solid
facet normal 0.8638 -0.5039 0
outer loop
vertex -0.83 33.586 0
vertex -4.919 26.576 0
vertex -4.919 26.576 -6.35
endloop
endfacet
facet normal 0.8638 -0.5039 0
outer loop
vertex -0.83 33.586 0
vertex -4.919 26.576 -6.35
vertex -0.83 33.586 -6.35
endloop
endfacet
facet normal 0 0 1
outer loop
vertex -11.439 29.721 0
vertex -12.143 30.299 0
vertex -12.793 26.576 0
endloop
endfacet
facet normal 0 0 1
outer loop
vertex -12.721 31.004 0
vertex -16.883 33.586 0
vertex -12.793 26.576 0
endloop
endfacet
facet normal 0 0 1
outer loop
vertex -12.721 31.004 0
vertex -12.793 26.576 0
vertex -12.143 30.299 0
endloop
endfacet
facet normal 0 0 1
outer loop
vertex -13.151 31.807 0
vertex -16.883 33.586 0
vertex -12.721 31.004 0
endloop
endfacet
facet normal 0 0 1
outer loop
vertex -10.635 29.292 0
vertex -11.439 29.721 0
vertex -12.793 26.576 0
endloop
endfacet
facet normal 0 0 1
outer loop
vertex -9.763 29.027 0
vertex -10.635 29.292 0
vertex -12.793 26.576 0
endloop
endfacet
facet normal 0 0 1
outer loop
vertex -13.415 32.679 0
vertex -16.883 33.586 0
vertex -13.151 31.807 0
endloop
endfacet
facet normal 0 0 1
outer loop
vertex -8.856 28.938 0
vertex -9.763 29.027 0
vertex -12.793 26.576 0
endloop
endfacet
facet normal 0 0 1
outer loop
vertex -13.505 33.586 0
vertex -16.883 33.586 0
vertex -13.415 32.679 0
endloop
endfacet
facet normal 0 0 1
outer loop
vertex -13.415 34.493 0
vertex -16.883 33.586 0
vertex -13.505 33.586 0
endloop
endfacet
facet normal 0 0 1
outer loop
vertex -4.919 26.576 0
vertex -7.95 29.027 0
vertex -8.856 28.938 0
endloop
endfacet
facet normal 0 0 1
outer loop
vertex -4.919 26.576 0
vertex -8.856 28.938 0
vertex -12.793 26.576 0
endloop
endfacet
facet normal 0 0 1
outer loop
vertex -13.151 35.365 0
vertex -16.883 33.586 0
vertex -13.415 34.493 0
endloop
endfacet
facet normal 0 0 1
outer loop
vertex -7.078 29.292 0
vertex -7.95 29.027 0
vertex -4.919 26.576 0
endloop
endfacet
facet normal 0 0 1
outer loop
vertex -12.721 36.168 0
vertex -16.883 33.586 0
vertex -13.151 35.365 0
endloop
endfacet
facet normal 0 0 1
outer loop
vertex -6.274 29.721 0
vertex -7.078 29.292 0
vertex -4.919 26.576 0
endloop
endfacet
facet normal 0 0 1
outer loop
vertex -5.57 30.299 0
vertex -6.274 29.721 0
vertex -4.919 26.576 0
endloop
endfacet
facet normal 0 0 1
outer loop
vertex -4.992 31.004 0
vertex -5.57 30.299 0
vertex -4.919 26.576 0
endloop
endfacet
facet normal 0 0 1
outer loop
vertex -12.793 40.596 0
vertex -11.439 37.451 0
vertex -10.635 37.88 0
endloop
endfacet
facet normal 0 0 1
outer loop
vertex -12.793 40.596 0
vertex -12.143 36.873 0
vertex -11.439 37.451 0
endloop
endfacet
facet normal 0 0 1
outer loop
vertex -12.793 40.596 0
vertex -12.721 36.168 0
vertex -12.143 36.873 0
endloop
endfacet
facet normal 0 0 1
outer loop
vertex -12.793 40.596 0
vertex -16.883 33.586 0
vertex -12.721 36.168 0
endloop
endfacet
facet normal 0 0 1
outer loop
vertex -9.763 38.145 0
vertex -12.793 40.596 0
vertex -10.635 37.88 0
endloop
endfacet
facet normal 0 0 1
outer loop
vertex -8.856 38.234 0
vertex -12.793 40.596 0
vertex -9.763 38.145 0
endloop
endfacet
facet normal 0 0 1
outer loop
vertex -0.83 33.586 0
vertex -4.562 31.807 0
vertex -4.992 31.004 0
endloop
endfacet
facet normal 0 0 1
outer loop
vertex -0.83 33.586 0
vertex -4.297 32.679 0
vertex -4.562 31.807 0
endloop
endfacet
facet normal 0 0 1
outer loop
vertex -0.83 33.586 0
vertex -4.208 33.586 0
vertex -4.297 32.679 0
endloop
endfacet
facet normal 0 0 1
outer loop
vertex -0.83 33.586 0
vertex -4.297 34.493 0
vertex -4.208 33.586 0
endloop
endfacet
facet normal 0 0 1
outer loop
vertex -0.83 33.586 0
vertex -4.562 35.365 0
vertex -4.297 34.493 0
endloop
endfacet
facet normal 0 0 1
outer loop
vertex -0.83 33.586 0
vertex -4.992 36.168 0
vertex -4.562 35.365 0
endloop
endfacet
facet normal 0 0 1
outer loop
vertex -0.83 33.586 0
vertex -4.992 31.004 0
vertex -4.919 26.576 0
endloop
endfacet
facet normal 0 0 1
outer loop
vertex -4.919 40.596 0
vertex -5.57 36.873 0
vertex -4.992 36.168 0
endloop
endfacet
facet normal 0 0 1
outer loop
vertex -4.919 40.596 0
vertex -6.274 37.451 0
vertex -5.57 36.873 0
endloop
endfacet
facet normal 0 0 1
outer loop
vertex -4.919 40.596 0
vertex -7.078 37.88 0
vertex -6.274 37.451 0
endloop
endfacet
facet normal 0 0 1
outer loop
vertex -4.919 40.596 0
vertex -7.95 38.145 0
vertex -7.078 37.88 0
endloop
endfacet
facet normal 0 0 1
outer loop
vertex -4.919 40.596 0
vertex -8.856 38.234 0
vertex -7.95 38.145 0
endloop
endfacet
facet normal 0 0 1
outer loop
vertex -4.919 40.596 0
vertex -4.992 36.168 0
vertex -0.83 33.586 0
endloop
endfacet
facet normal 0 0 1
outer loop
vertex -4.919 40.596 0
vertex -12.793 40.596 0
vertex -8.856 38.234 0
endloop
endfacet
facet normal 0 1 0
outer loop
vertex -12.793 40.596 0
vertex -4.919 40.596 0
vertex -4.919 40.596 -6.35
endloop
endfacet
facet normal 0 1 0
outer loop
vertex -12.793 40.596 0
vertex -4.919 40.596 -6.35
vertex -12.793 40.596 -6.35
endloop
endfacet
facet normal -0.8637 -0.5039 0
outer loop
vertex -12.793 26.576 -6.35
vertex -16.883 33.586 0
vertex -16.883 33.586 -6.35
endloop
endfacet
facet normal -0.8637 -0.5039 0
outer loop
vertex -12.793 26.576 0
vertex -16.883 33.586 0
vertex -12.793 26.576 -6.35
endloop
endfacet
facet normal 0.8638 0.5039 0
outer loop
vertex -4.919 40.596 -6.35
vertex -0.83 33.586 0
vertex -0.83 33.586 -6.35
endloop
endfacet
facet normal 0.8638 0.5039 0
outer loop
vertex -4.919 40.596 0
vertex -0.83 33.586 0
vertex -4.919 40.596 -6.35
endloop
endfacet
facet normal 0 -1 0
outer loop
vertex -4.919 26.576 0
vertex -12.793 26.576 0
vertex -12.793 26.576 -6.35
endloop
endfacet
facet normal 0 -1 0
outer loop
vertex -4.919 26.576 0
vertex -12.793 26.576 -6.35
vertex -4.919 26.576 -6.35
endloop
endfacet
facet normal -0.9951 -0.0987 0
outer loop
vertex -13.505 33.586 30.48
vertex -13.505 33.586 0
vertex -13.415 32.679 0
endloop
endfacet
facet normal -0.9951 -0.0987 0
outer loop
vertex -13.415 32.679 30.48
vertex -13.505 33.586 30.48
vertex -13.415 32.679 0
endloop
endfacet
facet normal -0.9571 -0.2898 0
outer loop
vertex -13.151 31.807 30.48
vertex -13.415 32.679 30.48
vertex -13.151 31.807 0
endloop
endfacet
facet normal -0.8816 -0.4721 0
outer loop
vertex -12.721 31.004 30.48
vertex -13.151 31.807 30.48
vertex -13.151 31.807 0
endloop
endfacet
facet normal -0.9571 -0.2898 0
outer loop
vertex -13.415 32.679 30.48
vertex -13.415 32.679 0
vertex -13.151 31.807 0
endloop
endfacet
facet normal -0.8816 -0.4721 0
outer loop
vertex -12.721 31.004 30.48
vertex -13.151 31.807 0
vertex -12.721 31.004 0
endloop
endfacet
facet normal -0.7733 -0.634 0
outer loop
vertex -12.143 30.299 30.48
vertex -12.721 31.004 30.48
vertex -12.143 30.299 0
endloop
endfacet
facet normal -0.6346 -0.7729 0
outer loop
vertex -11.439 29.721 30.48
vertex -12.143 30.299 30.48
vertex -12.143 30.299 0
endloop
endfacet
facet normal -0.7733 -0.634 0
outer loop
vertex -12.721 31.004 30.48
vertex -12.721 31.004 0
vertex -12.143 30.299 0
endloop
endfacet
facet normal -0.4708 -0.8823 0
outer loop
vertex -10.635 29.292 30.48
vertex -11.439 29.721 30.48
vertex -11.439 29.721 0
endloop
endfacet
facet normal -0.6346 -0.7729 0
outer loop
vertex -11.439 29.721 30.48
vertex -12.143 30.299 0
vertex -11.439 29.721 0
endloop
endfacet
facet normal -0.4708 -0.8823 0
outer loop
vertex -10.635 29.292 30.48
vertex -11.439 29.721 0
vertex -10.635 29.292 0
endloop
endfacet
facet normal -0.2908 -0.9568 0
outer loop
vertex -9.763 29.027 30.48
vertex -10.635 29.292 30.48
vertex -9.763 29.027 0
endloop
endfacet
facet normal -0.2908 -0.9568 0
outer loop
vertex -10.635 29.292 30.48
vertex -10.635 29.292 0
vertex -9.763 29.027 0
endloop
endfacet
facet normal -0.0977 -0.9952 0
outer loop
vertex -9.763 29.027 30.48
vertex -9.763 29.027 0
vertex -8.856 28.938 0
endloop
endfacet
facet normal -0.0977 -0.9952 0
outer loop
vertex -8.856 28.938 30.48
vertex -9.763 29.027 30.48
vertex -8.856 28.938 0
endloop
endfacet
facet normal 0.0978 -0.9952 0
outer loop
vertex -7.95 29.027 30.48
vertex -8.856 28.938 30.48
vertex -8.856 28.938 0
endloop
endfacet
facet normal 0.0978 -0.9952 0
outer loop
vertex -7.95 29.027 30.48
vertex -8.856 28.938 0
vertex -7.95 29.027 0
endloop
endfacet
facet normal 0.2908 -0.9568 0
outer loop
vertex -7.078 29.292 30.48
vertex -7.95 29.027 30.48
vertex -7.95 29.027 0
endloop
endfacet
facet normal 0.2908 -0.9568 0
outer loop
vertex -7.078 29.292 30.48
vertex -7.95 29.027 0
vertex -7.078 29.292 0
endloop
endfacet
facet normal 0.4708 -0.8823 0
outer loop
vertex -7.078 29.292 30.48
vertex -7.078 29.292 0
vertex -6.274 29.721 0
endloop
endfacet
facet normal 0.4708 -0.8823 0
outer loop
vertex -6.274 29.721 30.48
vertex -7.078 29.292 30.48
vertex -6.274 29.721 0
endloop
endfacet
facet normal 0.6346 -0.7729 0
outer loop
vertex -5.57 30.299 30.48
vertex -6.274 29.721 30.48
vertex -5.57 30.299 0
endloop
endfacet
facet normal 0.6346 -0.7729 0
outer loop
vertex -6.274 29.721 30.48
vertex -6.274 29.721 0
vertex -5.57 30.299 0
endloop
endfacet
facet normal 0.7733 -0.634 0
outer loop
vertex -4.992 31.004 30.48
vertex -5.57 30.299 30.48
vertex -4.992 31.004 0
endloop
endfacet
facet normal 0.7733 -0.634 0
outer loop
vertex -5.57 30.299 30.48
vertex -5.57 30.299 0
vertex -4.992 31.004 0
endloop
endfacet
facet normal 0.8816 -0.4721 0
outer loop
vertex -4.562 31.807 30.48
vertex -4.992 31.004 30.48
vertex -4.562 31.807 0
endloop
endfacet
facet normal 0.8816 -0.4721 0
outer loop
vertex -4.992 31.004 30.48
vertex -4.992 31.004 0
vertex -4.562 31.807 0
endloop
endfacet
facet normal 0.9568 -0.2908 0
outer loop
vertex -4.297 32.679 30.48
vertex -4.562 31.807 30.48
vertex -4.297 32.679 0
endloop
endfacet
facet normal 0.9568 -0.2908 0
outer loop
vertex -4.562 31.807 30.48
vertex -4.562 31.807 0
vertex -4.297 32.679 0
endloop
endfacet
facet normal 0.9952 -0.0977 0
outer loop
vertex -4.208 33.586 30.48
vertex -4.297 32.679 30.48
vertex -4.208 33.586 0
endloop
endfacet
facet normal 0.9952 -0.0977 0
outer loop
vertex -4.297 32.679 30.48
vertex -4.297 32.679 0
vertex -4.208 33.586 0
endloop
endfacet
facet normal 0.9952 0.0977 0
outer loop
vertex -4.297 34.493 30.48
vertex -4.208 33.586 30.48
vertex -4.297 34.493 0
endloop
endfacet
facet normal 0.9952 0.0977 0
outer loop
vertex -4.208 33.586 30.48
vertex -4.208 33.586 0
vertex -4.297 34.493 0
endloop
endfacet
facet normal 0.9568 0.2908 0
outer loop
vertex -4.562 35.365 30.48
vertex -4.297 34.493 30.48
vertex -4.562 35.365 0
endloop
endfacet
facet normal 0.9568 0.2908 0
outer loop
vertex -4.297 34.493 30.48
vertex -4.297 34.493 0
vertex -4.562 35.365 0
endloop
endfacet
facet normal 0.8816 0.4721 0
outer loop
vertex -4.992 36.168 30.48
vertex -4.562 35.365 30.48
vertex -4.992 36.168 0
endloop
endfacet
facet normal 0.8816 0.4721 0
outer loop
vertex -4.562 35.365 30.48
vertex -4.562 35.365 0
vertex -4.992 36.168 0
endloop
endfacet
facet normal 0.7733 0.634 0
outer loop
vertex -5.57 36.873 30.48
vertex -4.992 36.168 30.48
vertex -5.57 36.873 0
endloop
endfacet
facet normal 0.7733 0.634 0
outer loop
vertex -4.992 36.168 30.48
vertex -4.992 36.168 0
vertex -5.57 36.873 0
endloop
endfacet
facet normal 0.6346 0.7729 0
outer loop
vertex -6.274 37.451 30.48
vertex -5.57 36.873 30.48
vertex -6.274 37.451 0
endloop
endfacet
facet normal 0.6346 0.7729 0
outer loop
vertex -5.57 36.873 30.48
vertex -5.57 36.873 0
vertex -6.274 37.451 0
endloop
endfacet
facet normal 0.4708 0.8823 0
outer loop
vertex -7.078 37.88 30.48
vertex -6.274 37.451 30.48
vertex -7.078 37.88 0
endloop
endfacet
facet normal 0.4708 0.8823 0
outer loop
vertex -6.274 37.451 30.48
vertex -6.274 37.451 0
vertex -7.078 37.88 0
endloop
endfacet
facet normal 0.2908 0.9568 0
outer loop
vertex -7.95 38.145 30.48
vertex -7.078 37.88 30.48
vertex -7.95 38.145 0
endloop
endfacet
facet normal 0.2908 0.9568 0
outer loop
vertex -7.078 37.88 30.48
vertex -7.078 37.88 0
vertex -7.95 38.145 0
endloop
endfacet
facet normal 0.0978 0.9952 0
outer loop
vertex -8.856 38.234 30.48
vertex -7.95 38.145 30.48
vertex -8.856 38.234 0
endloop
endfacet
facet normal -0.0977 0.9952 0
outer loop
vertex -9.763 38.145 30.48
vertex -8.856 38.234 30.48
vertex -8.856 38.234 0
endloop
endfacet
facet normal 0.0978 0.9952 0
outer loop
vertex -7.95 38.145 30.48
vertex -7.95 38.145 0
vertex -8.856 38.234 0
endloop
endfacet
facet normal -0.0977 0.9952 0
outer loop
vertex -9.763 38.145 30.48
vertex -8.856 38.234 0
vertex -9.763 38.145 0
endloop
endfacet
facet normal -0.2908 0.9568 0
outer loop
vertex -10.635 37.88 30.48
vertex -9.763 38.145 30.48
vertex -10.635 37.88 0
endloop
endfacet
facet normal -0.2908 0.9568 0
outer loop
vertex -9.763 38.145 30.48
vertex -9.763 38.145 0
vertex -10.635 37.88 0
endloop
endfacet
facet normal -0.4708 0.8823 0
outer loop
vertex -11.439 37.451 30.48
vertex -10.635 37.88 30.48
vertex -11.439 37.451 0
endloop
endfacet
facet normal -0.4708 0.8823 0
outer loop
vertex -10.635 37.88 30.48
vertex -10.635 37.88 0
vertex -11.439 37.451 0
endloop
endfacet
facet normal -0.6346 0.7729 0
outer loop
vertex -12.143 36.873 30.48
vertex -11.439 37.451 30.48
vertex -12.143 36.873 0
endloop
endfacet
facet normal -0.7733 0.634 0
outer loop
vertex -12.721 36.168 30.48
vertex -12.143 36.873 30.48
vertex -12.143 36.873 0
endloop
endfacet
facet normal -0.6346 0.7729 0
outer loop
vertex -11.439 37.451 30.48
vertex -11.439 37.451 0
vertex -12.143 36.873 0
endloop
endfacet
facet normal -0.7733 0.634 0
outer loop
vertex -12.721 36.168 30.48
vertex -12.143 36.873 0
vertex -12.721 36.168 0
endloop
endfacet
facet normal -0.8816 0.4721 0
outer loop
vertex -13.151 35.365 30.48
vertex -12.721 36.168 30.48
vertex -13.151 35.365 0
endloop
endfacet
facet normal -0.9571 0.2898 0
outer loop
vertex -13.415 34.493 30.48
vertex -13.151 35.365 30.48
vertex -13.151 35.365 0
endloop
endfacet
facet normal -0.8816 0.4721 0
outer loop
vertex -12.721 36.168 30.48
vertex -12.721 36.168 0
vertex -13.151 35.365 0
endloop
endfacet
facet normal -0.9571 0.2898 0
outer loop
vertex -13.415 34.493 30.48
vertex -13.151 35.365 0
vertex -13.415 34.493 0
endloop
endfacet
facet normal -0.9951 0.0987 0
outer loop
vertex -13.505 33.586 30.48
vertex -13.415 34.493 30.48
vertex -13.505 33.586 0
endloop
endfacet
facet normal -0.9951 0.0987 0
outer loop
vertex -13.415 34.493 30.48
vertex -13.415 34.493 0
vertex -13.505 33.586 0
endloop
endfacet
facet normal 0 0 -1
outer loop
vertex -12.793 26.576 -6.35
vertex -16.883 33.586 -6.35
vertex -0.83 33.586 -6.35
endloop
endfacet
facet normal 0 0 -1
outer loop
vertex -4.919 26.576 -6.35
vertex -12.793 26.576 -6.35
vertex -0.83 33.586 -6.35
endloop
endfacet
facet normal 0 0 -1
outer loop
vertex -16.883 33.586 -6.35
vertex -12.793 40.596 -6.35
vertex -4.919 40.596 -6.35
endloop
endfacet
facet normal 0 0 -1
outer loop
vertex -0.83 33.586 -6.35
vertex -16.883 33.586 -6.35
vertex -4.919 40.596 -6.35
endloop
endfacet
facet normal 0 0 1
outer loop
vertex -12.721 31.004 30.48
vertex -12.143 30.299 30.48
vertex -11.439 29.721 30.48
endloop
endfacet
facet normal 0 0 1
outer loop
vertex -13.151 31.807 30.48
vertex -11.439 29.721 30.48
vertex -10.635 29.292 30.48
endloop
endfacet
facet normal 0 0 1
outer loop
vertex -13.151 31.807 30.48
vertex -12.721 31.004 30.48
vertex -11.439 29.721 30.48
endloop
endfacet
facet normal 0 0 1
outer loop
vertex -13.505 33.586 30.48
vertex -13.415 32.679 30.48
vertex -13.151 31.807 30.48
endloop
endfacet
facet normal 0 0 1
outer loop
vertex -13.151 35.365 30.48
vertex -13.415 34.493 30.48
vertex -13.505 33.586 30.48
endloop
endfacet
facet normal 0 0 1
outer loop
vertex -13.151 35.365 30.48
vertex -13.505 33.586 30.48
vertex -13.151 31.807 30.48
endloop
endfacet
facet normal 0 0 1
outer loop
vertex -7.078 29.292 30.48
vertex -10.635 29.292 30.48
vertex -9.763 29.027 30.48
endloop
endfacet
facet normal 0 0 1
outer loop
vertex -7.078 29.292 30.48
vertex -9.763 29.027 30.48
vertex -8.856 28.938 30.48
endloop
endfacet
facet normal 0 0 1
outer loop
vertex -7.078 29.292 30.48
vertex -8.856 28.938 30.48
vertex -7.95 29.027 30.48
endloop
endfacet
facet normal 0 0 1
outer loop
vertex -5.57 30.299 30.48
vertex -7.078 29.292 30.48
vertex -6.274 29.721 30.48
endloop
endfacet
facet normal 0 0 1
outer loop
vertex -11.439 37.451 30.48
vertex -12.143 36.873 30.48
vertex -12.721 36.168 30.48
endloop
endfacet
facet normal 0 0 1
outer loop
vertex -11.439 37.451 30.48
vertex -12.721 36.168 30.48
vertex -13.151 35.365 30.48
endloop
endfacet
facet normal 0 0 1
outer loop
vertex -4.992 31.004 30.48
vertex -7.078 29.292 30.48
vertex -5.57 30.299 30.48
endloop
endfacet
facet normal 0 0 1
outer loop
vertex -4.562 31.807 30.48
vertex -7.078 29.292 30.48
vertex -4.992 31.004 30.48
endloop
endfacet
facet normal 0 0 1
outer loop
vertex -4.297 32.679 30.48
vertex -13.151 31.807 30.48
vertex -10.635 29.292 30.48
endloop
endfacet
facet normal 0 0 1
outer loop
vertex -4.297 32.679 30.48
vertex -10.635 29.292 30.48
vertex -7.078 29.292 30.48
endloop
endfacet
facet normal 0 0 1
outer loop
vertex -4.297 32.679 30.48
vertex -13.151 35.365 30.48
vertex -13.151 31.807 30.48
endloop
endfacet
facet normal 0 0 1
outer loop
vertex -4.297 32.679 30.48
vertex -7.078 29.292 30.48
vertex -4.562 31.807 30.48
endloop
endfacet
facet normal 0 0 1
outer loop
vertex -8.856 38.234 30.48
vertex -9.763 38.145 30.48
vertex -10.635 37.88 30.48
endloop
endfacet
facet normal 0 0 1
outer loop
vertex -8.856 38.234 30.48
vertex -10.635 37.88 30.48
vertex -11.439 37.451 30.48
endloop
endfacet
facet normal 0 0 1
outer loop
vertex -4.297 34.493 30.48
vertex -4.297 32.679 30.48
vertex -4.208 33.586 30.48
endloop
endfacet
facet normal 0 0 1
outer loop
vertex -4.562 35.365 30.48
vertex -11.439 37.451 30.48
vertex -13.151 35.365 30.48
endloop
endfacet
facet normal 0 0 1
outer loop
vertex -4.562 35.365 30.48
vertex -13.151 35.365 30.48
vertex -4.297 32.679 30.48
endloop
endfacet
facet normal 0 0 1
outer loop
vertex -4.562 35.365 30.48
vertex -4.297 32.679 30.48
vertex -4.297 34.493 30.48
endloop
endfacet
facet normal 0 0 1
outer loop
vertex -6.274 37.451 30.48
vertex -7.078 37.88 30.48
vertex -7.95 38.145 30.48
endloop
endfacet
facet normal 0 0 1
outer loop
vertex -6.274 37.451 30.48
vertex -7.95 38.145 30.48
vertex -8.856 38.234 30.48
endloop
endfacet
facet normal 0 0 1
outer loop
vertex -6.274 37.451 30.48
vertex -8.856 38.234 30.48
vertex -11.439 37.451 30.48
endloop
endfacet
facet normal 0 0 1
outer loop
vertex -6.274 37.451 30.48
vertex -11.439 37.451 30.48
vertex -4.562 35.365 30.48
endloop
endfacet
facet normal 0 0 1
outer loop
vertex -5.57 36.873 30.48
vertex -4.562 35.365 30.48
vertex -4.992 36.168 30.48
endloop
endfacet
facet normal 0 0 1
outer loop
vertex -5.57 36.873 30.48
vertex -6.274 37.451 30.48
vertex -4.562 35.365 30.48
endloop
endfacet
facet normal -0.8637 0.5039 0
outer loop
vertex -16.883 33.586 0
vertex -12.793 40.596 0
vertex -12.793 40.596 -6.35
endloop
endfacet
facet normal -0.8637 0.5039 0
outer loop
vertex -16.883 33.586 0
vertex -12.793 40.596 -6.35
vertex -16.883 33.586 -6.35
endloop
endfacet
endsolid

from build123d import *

# Parameters (mm, degrees)
F1_DEPTH = 6.35
F3_DEPTH = 30.48


with BuildPart() as f1:
    # F0 (on Top) → F1 (new body)
    with BuildSketch(Plane.XY):
        with BuildLine():
            Line((-4.9193716261, 40.5964435692), (-8.8563716261, 40.5964435692))
            Line((-8.8563716261, 40.5964435692), (-8.8563716261, 38.2469435692))
            ThreePointArc((-8.8563716261, 38.2469435692), (-5.5606176297, 36.8817975657), (-4.1954716261, 33.5860435692))
            Line((-4.1954716261, 33.5860435692), (-0.8299716261, 33.5860435692))
            Line((-0.8299716261, 33.5860435692), (-4.9193716261, 40.5964435692))
        make_face()
        with BuildLine():
            Line((-8.8563716261, 38.2469435692), (-8.8563716261, 40.5964435692))
            Line((-8.8563716261, 40.5964435692), (-12.7933716261, 40.5964435692))
            Line((-12.7933716261, 40.5964435692), (-16.8827716261, 33.5860435692))
            Line((-16.8827716261, 33.5860435692), (-13.5172716261, 33.5860435692))
            ThreePointArc((-13.5172716261, 33.5860435692), (-12.1521256225, 36.8817975657), (-8.8563716261, 38.2469435692))
        make_face()
        with BuildLine():
            ThreePointArc((-8.8563716261, 28.9251435692), (-12.1521256225, 30.2902895728), (-13.5172716261, 33.5860435692))
            Line((-13.5172716261, 33.5860435692), (-16.8827716261, 33.5860435692))
            Line((-16.8827716261, 33.5860435692), (-12.7933716261, 26.5756435692))
            Line((-12.7933716261, 26.5756435692), (-8.8563716261, 26.5756435692))
            Line((-8.8563716261, 26.5756435692), (-8.8563716261, 28.9251435692))
        make_face()
        with BuildLine():
            Line((-0.8299716261, 33.5860435692), (-4.1954716261, 33.5860435692))
            ThreePointArc((-4.1954716261, 33.5860435692), (-5.5606176297, 30.2902895728), (-8.8563716261, 28.9251435692))
            Line((-8.8563716261, 28.9251435692), (-8.8563716261, 26.5756435692))
            Line((-8.8563716261, 26.5756435692), (-4.9193716261, 26.5756435692))
            Line((-4.9193716261, 26.5756435692), (-0.8299716261, 33.5860435692))
        make_face()
        with BuildLine():
            Line((-8.8563716261, 33.5860435692), (-8.8563716261, 38.2469435692))
            ThreePointArc((-8.8563716261, 38.2469435692), (-12.1521256225, 36.8817975657), (-13.5172716261, 33.5860435692))
            Line((-13.5172716261, 33.5860435692), (-8.8563716261, 33.5860435692))
        make_face()
        with BuildLine():
            ThreePointArc((-4.1954716261, 33.5860435692), (-5.5606176297, 36.8817975657), (-8.8563716261, 38.2469435692))
            Line((-8.8563716261, 38.2469435692), (-8.8563716261, 33.5860435692))
            Line((-8.8563716261, 33.5860435692), (-4.1954716261, 33.5860435692))
        make_face()
        with BuildLine():
            Line((-4.1954716261, 33.5860435692), (-8.8563716261, 33.5860435692))
            Line((-8.8563716261, 33.5860435692), (-8.8563716261, 28.9251435692))
            ThreePointArc((-8.8563716261, 28.9251435692), (-5.5606176297, 30.2902895728), (-4.1954716261, 33.5860435692))
        make_face()
        with BuildLine():
            Line((-8.8563716261, 28.9251435692), (-8.8563716261, 33.5860435692))
            Line((-8.8563716261, 33.5860435692), (-13.5172716261, 33.5860435692))
            ThreePointArc((-13.5172716261, 33.5860435692), (-12.1521256225, 30.2902895728), (-8.8563716261, 28.9251435692))
        make_face()
    extrude(amount=-F1_DEPTH)

    # F2 (on face) → F3 (join)
    with BuildSketch(Plane.XY):
        with BuildLine():
            Line((-13.5045716261, 33.5860435692), (-4.2081716261, 33.5860435692))
            ThreePointArc((-4.2081716261, 33.5860435692), (-8.8563716261, 38.2342435692), (-13.5045716261, 33.5860435692))
        make_face()
        with BuildLine():
            ThreePointArc((-13.5045716261, 33.5860435692), (-8.8563716261, 28.9378435692), (-4.2081716261, 33.5860435692))
            Line((-4.2081716261, 33.5860435692), (-13.5045716261, 33.5860435692))
        make_face()
    extrude(amount=F3_DEPTH)


solid = f1.part
